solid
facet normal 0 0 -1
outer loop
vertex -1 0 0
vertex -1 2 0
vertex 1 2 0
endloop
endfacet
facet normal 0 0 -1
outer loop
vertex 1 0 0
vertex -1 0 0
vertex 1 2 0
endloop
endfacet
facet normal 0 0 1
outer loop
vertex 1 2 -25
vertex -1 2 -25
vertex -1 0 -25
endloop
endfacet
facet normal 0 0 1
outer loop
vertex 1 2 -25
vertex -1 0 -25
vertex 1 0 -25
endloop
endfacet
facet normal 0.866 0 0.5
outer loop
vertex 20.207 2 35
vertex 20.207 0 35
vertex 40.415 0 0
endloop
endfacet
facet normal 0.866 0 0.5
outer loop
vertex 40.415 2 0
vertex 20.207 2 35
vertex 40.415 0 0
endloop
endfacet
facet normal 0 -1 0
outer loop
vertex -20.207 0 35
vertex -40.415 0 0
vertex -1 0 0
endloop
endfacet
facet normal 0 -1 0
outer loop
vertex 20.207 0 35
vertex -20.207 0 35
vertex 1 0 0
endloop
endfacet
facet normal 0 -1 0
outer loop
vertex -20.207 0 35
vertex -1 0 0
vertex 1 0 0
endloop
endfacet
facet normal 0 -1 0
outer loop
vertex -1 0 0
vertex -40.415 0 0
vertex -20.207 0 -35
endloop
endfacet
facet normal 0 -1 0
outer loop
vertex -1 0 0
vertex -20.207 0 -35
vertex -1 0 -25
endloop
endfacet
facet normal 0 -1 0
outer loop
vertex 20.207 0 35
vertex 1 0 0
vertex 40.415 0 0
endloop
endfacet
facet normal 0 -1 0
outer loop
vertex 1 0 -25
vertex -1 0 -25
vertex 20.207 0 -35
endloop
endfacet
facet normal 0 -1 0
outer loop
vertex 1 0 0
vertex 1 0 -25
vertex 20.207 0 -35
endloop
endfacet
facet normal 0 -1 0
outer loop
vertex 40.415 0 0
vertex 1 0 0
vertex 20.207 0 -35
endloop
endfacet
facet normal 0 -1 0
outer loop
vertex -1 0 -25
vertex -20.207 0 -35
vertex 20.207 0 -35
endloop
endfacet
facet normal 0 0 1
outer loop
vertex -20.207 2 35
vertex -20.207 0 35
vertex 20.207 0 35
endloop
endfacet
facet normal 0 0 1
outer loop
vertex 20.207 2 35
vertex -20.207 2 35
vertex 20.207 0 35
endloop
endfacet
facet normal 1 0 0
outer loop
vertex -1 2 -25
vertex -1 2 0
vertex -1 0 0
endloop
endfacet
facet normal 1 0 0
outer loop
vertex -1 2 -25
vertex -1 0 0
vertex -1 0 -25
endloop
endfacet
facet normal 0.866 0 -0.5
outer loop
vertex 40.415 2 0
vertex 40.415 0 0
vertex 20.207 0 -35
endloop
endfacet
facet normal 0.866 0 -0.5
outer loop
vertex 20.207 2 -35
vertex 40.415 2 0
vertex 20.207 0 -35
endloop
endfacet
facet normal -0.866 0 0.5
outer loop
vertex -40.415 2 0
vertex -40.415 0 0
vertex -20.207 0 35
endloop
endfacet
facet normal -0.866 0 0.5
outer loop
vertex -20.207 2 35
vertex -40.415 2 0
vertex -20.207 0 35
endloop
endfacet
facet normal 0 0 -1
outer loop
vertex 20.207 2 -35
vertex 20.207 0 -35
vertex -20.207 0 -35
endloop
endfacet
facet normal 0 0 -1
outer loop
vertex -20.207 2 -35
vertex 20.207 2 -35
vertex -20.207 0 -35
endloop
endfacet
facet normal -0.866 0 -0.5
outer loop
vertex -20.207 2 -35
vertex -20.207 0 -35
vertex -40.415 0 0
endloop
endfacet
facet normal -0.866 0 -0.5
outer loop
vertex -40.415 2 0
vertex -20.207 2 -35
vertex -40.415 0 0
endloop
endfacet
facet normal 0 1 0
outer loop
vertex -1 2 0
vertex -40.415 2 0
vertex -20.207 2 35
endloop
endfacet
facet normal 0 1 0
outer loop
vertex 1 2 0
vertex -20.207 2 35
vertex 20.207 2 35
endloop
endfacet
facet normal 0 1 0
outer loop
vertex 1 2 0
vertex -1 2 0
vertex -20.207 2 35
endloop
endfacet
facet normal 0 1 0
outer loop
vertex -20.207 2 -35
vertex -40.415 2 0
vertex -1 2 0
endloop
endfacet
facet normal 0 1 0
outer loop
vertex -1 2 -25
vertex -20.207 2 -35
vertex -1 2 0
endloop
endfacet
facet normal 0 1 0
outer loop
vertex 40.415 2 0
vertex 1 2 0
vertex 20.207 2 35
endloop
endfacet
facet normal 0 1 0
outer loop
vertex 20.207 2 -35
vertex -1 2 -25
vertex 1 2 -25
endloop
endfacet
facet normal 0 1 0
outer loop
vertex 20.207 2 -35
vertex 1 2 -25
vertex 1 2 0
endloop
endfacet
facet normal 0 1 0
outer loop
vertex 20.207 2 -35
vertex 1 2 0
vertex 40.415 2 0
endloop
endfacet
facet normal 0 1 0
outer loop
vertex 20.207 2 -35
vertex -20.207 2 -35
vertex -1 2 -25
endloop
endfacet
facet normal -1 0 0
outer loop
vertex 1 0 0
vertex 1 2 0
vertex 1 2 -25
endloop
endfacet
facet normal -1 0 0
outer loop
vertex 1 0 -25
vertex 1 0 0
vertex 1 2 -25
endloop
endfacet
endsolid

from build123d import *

# Parameters (mm, degrees)
BOSS_EXTRUDE1_DEPTH          = 2
SKETCH2_W                    = 2
SKETCH2_H                    = 25
CUT_EXTRUDE_THIN1_DEPTH      = 1
CUT_EXTRUDE_THIN1_DEPTH_BACK = 3


with BuildPart() as part:
    # Sketch1 → Boss-Extrude1 (new body)
    with BuildSketch(Plane(origin=(0, 0, 0), x_dir=(1, 0, 0), z_dir=(0, 1, 0))):
        Polygon((-20.207259422, -35), (20.207259422, -35), (40.414518843, 0), (20.207259422, 35), (-20.207259422, 35), (-40.414518843, 0), align=None)
    extrude(amount=BOSS_EXTRUDE1_DEPTH)

    # Sketch2 → Cut-Extrude-Thin1 (cut, two sides)
    with BuildSketch(Plane(origin=(0, 2, 0), x_dir=(1, 0, 0), z_dir=(0, 1, 0))) as cut_extrude_thin1_sk:
        with Locations((0, 12.5)):
            Rectangle(SKETCH2_W, SKETCH2_H)
    extrude(amount=CUT_EXTRUDE_THIN1_DEPTH, mode=Mode.SUBTRACT)
    extrude(cut_extrude_thin1_sk.sketch, amount=-CUT_EXTRUDE_THIN1_DEPTH_BACK, mode=Mode.SUBTRACT)


solid = part.part
